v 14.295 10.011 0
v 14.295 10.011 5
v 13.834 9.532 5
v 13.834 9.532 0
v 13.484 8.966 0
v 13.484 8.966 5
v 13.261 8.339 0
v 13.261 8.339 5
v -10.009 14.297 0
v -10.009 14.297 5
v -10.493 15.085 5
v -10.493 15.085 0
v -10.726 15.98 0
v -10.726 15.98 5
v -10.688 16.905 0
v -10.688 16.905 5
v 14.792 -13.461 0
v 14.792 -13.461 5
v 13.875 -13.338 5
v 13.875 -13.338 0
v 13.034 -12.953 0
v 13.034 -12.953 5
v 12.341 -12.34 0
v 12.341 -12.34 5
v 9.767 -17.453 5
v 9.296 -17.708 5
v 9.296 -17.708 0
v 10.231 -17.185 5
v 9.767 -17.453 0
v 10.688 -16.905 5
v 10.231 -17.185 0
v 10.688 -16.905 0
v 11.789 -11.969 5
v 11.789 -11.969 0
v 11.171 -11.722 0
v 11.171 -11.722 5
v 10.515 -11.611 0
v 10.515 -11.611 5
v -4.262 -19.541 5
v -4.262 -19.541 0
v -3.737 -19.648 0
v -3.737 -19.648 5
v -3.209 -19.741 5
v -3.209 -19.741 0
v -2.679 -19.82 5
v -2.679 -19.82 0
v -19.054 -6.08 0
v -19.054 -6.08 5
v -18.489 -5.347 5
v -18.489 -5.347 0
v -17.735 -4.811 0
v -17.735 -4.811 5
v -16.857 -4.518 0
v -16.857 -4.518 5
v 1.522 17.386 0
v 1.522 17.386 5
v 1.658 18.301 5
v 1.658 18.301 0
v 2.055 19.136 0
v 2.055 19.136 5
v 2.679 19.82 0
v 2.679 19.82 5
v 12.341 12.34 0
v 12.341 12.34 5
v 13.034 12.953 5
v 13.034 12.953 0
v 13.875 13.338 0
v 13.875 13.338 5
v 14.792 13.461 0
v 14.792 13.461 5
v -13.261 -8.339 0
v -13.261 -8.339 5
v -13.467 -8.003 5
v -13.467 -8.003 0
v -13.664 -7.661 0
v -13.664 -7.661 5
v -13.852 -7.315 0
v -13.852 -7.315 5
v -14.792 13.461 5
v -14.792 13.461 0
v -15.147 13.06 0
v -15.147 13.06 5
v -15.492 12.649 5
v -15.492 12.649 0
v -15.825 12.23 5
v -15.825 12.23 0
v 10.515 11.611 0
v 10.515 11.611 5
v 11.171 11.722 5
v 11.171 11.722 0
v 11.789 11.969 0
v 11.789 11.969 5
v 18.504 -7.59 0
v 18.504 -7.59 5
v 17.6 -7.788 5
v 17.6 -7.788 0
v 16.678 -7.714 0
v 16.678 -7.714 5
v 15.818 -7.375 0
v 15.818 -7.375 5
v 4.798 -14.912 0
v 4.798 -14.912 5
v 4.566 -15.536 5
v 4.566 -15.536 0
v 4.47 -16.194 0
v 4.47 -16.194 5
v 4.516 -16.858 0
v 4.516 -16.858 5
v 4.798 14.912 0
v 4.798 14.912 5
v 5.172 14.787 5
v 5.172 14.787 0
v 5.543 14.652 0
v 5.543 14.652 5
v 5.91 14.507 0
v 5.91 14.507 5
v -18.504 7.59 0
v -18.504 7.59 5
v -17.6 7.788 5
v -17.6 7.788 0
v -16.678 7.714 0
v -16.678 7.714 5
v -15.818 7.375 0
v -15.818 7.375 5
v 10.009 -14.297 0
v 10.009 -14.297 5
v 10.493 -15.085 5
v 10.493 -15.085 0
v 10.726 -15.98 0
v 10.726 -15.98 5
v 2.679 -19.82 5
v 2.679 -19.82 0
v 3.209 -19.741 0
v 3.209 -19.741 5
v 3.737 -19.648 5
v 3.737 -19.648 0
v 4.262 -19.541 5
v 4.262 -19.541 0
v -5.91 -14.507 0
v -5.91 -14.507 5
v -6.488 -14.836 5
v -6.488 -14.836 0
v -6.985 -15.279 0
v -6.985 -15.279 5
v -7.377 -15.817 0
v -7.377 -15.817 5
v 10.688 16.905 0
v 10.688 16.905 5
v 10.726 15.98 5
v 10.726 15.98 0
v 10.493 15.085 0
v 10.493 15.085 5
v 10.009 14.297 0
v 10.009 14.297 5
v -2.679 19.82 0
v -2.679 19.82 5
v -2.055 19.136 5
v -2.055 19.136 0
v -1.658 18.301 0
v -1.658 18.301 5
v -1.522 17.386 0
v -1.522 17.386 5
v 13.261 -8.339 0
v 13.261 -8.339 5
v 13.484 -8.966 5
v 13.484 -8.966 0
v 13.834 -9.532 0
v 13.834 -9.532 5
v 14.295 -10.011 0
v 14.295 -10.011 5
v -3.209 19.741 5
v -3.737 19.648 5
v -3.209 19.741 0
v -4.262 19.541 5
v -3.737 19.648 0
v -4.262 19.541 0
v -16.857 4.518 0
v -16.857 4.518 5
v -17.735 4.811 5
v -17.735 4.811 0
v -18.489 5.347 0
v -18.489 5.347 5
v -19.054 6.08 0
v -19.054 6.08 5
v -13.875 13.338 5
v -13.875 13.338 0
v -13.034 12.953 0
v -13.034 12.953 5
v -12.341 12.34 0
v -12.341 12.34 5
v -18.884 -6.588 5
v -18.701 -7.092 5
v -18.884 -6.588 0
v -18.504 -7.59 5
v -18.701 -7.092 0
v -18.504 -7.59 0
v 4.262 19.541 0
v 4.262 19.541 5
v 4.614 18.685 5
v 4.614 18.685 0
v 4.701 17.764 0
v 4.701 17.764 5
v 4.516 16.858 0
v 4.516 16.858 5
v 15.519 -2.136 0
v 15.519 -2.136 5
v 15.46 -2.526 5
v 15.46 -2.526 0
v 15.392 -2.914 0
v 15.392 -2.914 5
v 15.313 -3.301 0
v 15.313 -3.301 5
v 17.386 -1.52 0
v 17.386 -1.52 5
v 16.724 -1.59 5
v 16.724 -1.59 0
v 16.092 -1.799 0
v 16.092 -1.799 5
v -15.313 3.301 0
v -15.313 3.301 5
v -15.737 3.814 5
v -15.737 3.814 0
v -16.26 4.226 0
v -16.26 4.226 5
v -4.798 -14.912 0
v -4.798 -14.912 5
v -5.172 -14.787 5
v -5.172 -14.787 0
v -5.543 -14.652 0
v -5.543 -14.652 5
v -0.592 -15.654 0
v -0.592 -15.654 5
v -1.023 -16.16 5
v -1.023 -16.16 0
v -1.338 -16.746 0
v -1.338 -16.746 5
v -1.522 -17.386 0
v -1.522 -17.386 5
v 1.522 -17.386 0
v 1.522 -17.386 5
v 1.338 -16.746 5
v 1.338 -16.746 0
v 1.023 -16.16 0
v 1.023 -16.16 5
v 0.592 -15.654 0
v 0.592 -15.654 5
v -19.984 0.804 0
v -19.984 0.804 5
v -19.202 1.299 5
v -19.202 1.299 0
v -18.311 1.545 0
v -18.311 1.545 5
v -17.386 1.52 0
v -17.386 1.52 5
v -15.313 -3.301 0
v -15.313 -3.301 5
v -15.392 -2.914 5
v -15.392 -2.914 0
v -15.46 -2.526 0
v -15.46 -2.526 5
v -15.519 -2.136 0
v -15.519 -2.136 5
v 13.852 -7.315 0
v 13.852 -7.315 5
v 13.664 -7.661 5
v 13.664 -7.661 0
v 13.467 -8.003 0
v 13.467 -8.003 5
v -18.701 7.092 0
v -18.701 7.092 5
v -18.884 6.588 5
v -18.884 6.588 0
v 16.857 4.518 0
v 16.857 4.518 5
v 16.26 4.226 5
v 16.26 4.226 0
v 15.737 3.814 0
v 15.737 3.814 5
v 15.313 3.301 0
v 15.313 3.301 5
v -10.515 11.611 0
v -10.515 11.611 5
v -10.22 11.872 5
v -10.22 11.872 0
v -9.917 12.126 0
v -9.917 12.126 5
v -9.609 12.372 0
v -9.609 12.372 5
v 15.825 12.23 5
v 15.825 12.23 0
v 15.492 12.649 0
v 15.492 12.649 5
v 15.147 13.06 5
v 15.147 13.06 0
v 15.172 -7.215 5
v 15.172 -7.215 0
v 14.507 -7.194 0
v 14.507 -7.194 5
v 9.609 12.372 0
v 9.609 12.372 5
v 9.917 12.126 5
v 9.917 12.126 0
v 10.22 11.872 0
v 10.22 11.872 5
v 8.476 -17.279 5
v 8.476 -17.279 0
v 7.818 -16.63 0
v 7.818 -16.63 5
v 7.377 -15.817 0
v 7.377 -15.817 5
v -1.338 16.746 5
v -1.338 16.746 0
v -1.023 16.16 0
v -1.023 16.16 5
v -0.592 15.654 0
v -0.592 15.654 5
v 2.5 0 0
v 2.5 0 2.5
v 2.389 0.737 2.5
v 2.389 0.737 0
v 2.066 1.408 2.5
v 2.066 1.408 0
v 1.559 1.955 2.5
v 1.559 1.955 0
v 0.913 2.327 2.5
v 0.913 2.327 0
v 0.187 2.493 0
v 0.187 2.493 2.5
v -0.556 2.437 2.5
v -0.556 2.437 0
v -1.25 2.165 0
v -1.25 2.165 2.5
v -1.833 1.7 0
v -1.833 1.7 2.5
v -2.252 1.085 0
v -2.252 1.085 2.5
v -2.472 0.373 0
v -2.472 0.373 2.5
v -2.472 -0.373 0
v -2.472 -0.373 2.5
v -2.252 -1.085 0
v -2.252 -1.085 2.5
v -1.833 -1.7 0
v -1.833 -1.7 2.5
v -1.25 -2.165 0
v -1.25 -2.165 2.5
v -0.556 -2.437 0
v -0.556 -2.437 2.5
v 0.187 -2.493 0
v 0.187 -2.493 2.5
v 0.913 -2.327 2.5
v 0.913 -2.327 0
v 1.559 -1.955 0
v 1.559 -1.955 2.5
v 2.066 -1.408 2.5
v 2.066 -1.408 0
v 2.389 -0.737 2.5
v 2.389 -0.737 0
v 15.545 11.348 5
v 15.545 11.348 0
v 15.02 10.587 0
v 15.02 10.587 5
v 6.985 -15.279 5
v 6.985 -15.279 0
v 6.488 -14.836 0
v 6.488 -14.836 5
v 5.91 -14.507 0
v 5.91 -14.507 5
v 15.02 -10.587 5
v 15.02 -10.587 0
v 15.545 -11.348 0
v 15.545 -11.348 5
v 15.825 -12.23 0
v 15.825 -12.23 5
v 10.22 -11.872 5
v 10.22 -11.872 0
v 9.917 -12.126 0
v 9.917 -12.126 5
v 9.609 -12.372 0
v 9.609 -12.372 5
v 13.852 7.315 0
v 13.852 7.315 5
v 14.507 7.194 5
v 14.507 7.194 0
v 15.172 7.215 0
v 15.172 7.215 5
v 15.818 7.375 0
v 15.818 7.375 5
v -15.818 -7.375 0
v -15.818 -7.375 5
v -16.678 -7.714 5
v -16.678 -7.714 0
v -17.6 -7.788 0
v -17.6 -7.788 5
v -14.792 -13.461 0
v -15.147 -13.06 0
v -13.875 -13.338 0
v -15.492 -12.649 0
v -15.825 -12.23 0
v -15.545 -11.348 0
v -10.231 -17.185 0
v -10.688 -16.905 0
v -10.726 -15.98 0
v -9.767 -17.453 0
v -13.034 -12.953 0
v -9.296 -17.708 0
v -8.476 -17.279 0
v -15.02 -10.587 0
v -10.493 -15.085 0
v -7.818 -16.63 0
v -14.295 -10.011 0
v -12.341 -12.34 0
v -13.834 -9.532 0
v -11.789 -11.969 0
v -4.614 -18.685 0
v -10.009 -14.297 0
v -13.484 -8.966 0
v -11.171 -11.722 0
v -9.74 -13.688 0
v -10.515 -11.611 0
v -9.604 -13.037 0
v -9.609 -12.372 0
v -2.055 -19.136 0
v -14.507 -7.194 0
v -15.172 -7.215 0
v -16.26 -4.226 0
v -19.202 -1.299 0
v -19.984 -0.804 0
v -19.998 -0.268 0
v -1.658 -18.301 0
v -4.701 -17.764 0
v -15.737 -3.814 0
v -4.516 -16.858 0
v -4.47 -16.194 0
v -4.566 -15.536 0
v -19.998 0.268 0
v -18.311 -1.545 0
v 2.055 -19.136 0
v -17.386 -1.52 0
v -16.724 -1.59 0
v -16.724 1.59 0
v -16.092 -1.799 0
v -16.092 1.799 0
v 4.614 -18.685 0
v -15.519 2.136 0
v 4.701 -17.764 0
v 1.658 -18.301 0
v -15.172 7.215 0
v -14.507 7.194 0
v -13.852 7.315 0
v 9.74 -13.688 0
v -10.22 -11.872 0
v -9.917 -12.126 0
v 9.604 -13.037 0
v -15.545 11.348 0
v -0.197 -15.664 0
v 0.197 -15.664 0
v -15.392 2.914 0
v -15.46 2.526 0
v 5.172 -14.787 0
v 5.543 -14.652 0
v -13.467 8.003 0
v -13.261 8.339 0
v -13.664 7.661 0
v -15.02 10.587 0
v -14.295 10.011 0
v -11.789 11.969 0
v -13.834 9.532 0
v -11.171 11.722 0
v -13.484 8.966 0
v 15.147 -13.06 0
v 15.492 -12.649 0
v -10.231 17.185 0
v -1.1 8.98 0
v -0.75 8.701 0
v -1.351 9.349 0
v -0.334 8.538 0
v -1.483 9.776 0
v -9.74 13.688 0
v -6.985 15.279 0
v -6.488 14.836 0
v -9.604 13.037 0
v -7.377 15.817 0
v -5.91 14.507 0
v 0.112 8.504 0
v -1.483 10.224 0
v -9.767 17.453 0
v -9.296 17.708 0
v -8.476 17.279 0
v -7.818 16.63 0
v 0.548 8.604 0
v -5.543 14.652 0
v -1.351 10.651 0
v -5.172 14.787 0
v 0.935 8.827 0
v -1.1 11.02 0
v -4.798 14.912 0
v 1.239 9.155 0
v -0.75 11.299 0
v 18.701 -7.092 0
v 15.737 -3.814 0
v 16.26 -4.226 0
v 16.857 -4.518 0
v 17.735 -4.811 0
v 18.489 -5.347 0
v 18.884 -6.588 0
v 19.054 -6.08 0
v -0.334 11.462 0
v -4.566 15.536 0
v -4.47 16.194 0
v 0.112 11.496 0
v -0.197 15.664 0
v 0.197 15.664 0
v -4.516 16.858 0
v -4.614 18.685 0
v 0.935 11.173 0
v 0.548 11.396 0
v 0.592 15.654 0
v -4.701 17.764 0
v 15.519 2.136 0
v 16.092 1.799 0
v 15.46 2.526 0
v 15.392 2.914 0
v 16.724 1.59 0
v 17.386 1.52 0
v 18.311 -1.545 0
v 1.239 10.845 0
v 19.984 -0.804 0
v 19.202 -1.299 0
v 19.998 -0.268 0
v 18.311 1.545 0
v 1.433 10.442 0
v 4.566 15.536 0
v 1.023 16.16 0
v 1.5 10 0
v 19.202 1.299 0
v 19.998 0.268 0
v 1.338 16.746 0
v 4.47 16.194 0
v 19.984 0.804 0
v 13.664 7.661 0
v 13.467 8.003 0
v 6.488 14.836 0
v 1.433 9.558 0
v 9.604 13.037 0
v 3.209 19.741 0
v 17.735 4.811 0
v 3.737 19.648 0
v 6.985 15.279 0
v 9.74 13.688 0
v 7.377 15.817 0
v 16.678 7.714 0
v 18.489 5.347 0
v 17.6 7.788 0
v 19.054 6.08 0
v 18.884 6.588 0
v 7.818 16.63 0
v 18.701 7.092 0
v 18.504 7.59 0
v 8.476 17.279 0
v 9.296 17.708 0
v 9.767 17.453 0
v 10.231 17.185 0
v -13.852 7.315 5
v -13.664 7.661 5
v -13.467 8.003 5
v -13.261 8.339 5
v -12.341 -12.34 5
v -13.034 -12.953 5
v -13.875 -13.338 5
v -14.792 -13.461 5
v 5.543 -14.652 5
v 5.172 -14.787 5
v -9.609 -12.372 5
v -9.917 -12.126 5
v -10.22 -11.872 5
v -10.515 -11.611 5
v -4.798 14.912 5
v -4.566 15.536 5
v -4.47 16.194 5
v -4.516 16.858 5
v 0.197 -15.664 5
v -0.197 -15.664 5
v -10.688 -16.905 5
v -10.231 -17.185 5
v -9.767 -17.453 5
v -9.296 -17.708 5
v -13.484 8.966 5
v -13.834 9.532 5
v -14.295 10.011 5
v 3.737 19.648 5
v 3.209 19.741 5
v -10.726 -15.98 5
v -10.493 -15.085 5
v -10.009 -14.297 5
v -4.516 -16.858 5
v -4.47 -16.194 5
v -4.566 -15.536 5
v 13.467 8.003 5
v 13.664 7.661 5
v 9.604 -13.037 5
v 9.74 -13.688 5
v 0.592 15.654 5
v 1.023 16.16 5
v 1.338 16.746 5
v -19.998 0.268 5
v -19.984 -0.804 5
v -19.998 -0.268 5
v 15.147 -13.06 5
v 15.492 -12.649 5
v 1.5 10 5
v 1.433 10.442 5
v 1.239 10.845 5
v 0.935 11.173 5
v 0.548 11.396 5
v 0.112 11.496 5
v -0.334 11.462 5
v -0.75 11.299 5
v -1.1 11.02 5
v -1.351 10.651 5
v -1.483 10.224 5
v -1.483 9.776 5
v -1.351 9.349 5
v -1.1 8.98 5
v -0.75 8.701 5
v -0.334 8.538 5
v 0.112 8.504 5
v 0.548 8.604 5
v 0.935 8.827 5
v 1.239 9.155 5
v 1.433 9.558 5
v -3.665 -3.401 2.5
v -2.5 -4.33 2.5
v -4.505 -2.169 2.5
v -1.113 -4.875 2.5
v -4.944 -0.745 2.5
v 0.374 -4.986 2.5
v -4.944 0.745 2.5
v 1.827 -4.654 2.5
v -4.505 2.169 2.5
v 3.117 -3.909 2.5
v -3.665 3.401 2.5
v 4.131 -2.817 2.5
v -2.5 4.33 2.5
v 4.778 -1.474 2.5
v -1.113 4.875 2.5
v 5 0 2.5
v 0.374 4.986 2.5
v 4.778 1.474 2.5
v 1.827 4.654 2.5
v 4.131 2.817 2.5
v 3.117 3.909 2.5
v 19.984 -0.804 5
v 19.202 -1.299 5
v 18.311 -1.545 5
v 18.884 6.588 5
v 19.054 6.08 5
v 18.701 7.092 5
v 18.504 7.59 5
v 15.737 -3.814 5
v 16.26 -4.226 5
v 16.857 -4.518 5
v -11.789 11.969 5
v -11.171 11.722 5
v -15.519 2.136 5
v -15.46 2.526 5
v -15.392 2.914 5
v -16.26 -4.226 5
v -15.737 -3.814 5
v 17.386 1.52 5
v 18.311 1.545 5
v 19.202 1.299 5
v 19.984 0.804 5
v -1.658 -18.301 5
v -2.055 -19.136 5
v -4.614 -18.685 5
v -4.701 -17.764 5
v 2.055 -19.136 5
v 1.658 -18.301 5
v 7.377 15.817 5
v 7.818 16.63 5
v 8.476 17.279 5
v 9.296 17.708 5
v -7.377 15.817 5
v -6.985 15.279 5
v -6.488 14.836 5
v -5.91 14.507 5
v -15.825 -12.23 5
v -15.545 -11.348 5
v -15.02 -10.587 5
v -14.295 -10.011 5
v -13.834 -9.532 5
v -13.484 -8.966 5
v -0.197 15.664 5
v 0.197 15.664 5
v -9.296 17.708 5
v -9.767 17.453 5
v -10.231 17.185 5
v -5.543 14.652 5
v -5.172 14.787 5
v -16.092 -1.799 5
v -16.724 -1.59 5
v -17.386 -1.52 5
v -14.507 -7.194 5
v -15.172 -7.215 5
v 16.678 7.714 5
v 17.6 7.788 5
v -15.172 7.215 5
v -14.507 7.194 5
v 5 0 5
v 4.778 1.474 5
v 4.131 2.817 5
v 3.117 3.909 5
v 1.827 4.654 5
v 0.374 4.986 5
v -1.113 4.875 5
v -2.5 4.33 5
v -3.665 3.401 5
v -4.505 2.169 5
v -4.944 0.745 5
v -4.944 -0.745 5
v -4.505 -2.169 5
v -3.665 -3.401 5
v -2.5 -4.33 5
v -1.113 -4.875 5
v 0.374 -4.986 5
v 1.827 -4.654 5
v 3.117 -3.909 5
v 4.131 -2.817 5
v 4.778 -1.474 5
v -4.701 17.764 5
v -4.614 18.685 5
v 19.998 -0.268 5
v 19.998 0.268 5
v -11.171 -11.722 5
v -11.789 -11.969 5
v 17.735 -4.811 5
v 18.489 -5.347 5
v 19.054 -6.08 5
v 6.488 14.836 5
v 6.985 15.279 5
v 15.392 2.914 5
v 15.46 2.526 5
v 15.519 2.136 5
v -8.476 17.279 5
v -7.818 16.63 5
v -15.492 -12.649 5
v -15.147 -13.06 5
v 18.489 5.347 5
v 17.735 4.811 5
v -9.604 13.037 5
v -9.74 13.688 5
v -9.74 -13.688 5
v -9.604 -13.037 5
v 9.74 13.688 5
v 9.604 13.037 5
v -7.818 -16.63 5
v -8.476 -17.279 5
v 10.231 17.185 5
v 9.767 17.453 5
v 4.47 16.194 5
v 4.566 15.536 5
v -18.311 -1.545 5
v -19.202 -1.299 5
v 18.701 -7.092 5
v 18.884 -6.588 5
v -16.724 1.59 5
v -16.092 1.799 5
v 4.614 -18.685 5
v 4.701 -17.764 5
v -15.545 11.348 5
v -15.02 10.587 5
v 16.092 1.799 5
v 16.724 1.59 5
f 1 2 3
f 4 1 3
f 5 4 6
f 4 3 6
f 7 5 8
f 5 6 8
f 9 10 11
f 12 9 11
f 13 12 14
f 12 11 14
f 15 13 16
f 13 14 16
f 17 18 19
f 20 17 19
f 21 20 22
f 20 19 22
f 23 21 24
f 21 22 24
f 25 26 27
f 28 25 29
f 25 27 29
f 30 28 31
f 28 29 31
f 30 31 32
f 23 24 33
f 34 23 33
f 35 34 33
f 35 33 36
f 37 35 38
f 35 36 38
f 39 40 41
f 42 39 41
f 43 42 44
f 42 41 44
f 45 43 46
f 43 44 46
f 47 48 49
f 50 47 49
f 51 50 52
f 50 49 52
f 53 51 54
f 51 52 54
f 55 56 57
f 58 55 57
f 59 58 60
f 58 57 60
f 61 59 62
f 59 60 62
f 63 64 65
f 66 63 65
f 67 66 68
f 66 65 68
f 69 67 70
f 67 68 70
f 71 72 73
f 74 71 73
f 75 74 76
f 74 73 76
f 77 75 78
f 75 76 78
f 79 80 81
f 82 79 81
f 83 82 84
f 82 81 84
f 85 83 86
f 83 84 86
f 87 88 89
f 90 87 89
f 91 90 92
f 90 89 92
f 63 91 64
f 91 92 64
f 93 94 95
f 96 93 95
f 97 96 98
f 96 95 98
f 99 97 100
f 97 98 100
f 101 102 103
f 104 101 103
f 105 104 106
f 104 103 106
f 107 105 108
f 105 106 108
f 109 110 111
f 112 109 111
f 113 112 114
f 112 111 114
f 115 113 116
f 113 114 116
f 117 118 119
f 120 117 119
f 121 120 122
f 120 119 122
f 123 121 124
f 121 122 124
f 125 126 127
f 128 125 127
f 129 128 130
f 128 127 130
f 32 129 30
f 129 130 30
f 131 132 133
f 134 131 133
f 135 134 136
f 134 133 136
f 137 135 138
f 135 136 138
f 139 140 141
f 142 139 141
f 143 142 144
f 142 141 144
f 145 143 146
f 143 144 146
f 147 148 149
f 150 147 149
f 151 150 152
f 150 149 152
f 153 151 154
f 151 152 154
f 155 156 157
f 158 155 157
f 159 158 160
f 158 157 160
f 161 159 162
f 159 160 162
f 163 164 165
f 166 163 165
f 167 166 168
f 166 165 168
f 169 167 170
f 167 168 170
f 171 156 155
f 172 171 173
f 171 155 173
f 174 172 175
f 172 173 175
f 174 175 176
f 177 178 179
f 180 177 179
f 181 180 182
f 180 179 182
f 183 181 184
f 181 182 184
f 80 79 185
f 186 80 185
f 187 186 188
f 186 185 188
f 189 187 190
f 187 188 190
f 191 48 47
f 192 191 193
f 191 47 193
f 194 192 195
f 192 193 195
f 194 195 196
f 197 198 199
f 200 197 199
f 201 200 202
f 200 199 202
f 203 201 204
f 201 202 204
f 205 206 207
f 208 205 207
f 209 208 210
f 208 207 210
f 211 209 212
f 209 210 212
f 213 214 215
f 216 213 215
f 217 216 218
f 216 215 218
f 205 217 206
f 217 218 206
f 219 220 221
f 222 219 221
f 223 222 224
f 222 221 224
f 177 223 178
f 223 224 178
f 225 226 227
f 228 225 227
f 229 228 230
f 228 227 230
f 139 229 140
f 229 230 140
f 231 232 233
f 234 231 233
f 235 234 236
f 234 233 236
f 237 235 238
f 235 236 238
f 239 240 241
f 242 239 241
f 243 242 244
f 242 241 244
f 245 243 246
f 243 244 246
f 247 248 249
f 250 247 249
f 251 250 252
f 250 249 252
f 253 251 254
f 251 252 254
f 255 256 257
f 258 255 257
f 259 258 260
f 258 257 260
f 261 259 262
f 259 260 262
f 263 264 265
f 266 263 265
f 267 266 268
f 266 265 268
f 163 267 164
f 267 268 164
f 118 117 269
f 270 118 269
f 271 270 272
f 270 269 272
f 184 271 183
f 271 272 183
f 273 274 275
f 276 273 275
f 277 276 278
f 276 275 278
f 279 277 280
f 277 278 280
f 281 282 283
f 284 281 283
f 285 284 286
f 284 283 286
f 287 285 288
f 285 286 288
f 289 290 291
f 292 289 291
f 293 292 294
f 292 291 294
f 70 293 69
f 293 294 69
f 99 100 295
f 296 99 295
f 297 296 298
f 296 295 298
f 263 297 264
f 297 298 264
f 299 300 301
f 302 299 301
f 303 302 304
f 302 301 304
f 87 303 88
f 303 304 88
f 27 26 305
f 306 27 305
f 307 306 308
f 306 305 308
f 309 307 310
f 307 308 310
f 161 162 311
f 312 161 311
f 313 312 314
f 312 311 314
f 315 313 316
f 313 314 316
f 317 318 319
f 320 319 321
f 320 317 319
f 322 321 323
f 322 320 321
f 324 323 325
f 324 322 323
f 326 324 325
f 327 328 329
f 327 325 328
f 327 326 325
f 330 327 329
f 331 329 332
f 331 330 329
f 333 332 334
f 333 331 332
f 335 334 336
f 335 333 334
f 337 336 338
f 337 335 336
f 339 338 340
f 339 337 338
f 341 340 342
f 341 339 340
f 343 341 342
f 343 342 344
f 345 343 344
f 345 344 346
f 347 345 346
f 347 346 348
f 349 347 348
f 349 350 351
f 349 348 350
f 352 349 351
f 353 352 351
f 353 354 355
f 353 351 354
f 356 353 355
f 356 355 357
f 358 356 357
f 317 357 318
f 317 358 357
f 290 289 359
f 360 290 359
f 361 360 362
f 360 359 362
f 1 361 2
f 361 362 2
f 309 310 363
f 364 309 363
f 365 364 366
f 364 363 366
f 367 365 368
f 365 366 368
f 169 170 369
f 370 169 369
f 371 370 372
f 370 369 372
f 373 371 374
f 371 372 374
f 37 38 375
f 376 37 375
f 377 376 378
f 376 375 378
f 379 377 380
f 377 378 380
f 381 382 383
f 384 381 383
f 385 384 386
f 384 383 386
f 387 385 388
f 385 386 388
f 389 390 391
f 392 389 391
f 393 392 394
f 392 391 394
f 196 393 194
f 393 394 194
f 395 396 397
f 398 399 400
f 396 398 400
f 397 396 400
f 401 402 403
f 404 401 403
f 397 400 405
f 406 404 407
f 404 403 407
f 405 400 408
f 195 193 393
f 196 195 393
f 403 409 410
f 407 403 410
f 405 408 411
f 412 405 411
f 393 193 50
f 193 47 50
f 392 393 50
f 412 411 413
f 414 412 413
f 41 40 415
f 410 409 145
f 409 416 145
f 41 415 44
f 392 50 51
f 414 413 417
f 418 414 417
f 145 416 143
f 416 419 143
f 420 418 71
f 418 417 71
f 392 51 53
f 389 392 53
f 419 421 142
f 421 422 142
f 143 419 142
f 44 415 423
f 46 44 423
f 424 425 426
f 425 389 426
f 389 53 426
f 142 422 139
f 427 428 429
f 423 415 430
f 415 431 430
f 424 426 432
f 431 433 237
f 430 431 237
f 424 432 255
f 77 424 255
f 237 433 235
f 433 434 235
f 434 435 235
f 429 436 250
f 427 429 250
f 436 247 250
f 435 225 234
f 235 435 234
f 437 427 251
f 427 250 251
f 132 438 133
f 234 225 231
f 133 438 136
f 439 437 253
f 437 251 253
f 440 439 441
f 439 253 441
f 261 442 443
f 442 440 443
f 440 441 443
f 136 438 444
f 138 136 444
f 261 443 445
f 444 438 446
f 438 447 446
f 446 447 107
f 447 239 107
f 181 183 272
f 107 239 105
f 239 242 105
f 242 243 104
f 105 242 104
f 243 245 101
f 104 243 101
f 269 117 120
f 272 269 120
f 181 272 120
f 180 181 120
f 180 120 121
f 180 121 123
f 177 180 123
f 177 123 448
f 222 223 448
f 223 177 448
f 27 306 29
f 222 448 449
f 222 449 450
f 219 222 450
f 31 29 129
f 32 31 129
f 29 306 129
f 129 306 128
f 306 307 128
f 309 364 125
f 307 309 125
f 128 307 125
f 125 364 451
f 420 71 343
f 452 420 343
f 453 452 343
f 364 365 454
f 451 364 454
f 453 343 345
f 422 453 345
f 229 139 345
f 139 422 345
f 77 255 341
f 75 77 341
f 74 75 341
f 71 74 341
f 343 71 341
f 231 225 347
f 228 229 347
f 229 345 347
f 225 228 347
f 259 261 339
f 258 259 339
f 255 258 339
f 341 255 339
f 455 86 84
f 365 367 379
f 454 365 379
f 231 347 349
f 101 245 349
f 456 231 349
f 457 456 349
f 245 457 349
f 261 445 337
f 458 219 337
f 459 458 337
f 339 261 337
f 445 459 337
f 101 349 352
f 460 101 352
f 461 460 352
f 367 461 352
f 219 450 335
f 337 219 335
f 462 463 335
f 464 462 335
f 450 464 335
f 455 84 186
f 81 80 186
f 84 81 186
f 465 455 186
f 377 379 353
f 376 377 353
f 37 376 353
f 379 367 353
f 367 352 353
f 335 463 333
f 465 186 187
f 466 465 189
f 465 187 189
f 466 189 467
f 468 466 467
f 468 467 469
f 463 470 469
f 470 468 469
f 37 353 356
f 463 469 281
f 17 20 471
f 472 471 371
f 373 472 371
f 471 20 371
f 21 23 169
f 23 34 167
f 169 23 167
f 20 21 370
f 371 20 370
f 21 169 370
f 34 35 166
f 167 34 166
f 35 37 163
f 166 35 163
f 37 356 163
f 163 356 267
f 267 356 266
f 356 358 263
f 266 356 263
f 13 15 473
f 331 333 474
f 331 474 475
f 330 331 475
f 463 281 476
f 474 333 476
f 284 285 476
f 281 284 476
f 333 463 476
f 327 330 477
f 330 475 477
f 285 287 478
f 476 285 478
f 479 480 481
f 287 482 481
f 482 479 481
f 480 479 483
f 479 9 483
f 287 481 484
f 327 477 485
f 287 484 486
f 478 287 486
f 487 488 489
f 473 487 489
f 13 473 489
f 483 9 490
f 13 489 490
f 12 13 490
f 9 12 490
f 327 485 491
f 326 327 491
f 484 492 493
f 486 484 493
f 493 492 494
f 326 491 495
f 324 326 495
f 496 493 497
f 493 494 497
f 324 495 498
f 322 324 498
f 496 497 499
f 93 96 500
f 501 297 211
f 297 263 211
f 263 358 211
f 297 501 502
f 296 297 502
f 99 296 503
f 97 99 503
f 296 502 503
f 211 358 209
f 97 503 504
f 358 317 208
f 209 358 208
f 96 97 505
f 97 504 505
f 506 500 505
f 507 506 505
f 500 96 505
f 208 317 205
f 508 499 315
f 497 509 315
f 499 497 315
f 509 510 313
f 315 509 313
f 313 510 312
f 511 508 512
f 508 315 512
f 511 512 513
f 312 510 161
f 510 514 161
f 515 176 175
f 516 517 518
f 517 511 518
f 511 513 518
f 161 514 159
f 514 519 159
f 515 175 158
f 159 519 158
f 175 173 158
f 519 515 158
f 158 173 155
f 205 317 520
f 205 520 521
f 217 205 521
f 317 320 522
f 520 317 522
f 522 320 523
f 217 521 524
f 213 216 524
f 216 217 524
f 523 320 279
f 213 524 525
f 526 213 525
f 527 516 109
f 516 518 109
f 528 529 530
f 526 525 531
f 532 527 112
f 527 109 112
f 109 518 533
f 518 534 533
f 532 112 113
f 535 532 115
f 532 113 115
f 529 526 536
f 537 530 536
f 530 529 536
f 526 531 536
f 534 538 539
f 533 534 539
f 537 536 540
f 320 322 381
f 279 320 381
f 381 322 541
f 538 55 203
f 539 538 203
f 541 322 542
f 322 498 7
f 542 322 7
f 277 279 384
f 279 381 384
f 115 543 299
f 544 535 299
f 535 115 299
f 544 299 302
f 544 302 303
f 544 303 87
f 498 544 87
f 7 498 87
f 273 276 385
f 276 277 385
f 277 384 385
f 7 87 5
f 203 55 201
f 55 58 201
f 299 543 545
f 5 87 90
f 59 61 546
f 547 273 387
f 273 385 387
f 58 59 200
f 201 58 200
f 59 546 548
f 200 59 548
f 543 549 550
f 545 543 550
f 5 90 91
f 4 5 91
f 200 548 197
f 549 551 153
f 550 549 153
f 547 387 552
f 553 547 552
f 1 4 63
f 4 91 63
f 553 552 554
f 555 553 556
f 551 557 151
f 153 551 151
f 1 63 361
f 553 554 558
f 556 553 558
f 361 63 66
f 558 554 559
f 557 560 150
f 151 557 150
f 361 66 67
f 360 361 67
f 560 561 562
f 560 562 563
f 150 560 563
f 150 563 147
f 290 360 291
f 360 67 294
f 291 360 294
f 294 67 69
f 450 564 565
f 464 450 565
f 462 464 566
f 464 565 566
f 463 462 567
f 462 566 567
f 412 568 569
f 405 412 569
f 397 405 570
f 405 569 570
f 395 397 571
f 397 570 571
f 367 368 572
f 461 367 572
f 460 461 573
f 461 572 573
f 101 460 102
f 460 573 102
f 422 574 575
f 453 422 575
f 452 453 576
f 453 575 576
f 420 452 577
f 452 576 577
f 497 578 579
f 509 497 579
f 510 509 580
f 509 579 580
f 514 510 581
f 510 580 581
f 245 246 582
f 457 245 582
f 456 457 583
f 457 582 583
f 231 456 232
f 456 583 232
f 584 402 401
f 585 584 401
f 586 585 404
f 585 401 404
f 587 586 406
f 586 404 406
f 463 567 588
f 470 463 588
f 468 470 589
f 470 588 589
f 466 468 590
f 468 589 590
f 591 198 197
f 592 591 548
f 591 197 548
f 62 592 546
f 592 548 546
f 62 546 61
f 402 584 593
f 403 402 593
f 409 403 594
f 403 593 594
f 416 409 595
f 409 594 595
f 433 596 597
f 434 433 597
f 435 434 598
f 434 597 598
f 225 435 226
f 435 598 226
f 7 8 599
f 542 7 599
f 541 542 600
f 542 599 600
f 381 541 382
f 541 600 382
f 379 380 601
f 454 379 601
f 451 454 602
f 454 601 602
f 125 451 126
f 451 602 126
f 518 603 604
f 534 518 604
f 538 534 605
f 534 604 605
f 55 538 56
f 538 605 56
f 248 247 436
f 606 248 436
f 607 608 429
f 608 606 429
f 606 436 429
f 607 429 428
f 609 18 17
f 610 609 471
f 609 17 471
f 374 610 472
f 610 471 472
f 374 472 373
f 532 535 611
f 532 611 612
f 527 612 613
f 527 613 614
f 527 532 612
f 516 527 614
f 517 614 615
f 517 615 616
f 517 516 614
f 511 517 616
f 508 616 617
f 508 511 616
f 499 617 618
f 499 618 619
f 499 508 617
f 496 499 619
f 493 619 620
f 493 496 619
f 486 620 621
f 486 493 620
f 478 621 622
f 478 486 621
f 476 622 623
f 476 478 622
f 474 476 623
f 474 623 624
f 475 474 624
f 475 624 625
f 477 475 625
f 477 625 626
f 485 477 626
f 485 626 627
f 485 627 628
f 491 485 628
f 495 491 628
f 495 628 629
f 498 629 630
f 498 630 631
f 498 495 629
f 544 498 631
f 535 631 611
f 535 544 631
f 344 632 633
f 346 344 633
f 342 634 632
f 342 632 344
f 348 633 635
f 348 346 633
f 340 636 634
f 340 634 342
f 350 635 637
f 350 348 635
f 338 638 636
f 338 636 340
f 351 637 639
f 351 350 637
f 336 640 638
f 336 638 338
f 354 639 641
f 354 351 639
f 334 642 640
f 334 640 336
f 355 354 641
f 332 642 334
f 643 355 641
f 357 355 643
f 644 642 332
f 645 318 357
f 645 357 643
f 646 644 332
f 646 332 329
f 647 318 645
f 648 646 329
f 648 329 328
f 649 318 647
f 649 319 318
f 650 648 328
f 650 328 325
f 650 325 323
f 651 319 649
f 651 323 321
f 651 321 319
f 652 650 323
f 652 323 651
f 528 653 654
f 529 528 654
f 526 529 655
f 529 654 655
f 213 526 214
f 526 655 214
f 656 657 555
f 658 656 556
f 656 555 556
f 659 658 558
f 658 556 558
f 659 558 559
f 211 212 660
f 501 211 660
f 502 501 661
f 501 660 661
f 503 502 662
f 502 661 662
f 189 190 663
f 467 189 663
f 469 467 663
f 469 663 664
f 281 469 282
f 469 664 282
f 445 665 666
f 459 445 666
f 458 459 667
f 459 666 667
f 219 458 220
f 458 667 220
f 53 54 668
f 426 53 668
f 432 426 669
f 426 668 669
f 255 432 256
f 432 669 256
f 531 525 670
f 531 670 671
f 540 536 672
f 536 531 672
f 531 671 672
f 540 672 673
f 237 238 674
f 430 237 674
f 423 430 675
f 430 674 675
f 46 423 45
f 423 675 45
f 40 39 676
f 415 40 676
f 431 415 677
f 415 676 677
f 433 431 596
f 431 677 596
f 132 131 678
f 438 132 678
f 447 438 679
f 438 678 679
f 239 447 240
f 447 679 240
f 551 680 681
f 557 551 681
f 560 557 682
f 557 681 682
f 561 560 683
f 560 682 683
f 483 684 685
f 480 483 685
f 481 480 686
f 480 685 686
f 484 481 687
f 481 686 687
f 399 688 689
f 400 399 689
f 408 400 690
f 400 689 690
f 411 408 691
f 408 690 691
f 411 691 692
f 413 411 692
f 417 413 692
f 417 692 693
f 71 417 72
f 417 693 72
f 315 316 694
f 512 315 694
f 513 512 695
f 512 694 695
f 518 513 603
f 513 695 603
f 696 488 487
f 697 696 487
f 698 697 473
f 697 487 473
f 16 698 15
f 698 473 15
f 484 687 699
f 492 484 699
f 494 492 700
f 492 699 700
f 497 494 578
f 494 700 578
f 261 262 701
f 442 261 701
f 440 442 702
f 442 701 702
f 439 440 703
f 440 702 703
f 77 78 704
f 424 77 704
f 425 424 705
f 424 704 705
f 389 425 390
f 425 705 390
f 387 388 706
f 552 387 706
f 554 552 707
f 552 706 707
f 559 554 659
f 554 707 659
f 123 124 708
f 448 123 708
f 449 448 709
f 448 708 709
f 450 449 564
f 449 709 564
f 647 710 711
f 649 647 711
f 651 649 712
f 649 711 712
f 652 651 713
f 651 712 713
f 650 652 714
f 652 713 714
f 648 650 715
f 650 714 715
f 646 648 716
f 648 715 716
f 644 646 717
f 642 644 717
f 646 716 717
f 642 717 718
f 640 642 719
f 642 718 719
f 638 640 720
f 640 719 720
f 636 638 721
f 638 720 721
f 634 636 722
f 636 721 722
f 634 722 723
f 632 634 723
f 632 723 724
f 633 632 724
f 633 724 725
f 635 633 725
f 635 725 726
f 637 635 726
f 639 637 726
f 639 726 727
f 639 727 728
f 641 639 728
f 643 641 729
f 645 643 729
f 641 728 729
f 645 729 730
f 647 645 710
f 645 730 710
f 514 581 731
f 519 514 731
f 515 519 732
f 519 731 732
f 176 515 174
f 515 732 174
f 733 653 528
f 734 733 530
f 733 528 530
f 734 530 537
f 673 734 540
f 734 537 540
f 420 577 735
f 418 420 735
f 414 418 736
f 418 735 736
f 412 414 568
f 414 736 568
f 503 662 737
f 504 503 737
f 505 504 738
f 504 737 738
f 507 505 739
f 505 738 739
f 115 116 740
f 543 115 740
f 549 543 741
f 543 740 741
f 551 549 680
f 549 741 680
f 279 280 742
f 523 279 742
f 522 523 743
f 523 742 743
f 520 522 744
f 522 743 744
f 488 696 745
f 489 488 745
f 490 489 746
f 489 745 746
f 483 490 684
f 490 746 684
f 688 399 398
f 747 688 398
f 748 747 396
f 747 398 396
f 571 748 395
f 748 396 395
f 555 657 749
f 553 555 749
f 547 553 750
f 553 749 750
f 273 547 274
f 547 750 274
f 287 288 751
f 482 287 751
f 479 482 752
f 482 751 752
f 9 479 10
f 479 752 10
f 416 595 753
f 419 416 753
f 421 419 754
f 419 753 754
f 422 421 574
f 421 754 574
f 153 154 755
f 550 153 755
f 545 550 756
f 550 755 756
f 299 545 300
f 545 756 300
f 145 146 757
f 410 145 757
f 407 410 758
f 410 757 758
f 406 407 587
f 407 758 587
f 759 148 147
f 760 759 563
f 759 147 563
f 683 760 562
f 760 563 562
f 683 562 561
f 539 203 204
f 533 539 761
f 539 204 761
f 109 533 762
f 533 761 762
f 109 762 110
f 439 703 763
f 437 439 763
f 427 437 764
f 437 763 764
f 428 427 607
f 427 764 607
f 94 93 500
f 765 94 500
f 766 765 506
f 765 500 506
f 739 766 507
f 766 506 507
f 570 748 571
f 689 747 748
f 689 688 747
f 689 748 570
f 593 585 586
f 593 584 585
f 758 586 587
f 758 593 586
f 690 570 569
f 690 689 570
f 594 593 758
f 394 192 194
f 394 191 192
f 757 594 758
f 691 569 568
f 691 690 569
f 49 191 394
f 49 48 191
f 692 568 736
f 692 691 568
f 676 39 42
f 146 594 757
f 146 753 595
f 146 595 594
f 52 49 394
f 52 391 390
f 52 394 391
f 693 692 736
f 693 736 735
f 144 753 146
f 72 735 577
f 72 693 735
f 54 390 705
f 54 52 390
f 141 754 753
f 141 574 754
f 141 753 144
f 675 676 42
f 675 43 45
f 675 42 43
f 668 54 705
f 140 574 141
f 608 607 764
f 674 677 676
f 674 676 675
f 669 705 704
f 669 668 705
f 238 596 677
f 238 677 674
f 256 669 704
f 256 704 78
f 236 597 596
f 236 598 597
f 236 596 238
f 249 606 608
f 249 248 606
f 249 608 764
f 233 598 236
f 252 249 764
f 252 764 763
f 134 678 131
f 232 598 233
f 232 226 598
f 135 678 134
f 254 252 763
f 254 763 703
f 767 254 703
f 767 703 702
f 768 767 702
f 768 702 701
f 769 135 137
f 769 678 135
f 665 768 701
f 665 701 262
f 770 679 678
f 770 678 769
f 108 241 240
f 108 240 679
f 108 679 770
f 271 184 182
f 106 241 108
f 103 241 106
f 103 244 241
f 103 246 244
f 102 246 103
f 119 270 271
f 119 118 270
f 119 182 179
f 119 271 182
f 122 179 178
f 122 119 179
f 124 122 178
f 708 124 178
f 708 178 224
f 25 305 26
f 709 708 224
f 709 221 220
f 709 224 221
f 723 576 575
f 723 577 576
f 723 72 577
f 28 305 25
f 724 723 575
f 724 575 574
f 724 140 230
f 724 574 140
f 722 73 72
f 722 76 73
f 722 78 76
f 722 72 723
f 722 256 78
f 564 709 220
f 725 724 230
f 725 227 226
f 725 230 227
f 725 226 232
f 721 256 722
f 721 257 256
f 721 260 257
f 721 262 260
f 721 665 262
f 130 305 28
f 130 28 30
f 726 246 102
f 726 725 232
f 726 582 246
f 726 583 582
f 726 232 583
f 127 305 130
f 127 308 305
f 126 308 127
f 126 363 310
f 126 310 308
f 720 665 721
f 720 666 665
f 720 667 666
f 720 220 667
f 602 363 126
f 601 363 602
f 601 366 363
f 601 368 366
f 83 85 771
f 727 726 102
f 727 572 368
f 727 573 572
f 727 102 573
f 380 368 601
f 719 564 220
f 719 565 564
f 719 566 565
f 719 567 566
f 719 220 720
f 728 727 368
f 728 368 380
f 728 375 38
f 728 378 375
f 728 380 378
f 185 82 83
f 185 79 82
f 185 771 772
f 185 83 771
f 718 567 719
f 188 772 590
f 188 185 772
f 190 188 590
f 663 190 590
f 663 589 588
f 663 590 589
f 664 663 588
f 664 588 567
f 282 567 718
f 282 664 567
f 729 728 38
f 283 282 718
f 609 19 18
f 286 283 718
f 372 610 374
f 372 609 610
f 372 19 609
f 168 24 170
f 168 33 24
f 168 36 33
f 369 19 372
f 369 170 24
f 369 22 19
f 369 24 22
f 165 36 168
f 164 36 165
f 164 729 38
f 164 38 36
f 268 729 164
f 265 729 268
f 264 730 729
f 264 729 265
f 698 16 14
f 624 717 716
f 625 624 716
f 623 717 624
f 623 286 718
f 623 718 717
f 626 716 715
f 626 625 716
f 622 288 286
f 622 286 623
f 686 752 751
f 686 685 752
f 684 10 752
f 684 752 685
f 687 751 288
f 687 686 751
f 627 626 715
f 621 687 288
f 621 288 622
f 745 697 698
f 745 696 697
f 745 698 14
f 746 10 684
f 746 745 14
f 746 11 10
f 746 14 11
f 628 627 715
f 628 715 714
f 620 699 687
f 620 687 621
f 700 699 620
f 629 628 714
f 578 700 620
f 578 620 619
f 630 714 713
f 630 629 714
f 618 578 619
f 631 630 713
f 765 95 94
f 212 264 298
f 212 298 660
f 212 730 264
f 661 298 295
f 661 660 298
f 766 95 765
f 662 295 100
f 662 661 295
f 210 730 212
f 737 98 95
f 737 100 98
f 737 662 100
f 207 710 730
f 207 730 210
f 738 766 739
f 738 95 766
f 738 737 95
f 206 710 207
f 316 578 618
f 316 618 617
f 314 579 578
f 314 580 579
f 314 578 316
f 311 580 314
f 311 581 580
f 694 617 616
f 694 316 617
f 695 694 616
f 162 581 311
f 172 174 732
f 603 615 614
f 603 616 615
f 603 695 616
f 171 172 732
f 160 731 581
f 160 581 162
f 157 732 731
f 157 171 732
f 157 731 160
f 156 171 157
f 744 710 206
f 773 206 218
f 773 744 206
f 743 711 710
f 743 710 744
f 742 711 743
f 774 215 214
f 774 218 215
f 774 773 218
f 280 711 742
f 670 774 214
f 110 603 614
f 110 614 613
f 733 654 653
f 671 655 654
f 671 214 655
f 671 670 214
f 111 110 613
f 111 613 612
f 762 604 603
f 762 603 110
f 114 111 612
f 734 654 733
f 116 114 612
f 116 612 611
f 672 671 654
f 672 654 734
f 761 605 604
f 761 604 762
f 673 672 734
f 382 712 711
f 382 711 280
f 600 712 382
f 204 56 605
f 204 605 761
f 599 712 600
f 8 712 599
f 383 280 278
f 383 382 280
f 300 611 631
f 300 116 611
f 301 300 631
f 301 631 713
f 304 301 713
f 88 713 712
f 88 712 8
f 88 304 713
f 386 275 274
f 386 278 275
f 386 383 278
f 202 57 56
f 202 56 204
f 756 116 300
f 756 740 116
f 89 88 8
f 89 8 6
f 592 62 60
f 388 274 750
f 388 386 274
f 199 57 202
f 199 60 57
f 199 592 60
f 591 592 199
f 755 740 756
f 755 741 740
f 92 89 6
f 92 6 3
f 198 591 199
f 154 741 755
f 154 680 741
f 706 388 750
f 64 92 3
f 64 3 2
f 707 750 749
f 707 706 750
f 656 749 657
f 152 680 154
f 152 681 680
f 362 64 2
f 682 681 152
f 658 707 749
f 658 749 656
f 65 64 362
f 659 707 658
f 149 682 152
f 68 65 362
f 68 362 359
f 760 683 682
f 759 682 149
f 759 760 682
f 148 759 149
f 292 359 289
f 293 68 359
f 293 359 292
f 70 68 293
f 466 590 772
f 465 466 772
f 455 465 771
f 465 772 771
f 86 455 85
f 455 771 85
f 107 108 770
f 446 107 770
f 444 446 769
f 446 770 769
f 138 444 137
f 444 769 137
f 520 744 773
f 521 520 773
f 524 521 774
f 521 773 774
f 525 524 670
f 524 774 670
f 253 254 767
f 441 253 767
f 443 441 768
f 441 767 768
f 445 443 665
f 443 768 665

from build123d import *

# Parameters (mm, degrees)
CROQUIS1_R              = 20
CROQUIS1_R_2            = 2.5
CROQUIS1_R_3            = 1.5
SALIENTE_EXTRUIR1_DEPTH = 5
CORTAR_EXTRUIR1_DEPTH   = 29.722813233
MATRIZC1_COUNT          = 18
CROQUIS3_R              = 5
CORTAR_EXTRUIR2_DEPTH   = 2.5


with BuildPart() as part:
    # Croquis1 → Saliente-Extruir1 (new body)
    with BuildSketch(Plane.XY):
        Circle(CROQUIS1_R)
        Circle(CROQUIS1_R_2, mode=Mode.SUBTRACT)
        with Locations((0, 10)):
            Circle(CROQUIS1_R_3, mode=Mode.SUBTRACT)
    extrude(amount=SALIENTE_EXTRUIR1_DEPTH)

    # Croquis2 → Cortar-Extruir1 (cut, through all)
    with BuildSketch(Plane.XY.offset(5)):
        with BuildLine():
            ThreePointArc((2.678584333, 19.819818011), (0, 20), (-2.678584333, 19.819818011))
            ThreePointArc((-2.678584333, 19.819818011), (-1.82600889, 18.733131722), (-1.522223543, 17.385731841))
            ThreePointArc((-1.522223543, 17.385731841), (-1.19593308, 16.445057276), (-0.5915417, 15.653827117))
            ThreePointArc((-0.5915417, 15.653827117), (0, 15.665), (0.5915417, 15.653827117))
            ThreePointArc((0.5915417, 15.653827117), (1.19593308, 16.445057276), (1.522223543, 17.385731841))
            ThreePointArc((1.522223543, 17.385731841), (1.82600889, 18.733131722), (2.678584333, 19.819818011))
        make_face()
    cortar_extruir1 = extrude(amount=-CORTAR_EXTRUIR1_DEPTH, mode=Mode.SUBTRACT)

    # MatrizC1: Cortar-Extruir1 ×18 about axis
    matrizc1_axis = Axis((0, 0, 0), (0, 0, 1))
    for i in range(1, MATRIZC1_COUNT):
        add(cortar_extruir1.rotate(matrizc1_axis, i * 360 / MATRIZC1_COUNT), mode=Mode.SUBTRACT)

    # Croquis3 → Cortar-Extruir2 (cut)
    with BuildSketch(Plane.XY.offset(5)):
        Circle(CROQUIS3_R)
    extrude(amount=-CORTAR_EXTRUIR2_DEPTH, mode=Mode.SUBTRACT)


solid = part.part
